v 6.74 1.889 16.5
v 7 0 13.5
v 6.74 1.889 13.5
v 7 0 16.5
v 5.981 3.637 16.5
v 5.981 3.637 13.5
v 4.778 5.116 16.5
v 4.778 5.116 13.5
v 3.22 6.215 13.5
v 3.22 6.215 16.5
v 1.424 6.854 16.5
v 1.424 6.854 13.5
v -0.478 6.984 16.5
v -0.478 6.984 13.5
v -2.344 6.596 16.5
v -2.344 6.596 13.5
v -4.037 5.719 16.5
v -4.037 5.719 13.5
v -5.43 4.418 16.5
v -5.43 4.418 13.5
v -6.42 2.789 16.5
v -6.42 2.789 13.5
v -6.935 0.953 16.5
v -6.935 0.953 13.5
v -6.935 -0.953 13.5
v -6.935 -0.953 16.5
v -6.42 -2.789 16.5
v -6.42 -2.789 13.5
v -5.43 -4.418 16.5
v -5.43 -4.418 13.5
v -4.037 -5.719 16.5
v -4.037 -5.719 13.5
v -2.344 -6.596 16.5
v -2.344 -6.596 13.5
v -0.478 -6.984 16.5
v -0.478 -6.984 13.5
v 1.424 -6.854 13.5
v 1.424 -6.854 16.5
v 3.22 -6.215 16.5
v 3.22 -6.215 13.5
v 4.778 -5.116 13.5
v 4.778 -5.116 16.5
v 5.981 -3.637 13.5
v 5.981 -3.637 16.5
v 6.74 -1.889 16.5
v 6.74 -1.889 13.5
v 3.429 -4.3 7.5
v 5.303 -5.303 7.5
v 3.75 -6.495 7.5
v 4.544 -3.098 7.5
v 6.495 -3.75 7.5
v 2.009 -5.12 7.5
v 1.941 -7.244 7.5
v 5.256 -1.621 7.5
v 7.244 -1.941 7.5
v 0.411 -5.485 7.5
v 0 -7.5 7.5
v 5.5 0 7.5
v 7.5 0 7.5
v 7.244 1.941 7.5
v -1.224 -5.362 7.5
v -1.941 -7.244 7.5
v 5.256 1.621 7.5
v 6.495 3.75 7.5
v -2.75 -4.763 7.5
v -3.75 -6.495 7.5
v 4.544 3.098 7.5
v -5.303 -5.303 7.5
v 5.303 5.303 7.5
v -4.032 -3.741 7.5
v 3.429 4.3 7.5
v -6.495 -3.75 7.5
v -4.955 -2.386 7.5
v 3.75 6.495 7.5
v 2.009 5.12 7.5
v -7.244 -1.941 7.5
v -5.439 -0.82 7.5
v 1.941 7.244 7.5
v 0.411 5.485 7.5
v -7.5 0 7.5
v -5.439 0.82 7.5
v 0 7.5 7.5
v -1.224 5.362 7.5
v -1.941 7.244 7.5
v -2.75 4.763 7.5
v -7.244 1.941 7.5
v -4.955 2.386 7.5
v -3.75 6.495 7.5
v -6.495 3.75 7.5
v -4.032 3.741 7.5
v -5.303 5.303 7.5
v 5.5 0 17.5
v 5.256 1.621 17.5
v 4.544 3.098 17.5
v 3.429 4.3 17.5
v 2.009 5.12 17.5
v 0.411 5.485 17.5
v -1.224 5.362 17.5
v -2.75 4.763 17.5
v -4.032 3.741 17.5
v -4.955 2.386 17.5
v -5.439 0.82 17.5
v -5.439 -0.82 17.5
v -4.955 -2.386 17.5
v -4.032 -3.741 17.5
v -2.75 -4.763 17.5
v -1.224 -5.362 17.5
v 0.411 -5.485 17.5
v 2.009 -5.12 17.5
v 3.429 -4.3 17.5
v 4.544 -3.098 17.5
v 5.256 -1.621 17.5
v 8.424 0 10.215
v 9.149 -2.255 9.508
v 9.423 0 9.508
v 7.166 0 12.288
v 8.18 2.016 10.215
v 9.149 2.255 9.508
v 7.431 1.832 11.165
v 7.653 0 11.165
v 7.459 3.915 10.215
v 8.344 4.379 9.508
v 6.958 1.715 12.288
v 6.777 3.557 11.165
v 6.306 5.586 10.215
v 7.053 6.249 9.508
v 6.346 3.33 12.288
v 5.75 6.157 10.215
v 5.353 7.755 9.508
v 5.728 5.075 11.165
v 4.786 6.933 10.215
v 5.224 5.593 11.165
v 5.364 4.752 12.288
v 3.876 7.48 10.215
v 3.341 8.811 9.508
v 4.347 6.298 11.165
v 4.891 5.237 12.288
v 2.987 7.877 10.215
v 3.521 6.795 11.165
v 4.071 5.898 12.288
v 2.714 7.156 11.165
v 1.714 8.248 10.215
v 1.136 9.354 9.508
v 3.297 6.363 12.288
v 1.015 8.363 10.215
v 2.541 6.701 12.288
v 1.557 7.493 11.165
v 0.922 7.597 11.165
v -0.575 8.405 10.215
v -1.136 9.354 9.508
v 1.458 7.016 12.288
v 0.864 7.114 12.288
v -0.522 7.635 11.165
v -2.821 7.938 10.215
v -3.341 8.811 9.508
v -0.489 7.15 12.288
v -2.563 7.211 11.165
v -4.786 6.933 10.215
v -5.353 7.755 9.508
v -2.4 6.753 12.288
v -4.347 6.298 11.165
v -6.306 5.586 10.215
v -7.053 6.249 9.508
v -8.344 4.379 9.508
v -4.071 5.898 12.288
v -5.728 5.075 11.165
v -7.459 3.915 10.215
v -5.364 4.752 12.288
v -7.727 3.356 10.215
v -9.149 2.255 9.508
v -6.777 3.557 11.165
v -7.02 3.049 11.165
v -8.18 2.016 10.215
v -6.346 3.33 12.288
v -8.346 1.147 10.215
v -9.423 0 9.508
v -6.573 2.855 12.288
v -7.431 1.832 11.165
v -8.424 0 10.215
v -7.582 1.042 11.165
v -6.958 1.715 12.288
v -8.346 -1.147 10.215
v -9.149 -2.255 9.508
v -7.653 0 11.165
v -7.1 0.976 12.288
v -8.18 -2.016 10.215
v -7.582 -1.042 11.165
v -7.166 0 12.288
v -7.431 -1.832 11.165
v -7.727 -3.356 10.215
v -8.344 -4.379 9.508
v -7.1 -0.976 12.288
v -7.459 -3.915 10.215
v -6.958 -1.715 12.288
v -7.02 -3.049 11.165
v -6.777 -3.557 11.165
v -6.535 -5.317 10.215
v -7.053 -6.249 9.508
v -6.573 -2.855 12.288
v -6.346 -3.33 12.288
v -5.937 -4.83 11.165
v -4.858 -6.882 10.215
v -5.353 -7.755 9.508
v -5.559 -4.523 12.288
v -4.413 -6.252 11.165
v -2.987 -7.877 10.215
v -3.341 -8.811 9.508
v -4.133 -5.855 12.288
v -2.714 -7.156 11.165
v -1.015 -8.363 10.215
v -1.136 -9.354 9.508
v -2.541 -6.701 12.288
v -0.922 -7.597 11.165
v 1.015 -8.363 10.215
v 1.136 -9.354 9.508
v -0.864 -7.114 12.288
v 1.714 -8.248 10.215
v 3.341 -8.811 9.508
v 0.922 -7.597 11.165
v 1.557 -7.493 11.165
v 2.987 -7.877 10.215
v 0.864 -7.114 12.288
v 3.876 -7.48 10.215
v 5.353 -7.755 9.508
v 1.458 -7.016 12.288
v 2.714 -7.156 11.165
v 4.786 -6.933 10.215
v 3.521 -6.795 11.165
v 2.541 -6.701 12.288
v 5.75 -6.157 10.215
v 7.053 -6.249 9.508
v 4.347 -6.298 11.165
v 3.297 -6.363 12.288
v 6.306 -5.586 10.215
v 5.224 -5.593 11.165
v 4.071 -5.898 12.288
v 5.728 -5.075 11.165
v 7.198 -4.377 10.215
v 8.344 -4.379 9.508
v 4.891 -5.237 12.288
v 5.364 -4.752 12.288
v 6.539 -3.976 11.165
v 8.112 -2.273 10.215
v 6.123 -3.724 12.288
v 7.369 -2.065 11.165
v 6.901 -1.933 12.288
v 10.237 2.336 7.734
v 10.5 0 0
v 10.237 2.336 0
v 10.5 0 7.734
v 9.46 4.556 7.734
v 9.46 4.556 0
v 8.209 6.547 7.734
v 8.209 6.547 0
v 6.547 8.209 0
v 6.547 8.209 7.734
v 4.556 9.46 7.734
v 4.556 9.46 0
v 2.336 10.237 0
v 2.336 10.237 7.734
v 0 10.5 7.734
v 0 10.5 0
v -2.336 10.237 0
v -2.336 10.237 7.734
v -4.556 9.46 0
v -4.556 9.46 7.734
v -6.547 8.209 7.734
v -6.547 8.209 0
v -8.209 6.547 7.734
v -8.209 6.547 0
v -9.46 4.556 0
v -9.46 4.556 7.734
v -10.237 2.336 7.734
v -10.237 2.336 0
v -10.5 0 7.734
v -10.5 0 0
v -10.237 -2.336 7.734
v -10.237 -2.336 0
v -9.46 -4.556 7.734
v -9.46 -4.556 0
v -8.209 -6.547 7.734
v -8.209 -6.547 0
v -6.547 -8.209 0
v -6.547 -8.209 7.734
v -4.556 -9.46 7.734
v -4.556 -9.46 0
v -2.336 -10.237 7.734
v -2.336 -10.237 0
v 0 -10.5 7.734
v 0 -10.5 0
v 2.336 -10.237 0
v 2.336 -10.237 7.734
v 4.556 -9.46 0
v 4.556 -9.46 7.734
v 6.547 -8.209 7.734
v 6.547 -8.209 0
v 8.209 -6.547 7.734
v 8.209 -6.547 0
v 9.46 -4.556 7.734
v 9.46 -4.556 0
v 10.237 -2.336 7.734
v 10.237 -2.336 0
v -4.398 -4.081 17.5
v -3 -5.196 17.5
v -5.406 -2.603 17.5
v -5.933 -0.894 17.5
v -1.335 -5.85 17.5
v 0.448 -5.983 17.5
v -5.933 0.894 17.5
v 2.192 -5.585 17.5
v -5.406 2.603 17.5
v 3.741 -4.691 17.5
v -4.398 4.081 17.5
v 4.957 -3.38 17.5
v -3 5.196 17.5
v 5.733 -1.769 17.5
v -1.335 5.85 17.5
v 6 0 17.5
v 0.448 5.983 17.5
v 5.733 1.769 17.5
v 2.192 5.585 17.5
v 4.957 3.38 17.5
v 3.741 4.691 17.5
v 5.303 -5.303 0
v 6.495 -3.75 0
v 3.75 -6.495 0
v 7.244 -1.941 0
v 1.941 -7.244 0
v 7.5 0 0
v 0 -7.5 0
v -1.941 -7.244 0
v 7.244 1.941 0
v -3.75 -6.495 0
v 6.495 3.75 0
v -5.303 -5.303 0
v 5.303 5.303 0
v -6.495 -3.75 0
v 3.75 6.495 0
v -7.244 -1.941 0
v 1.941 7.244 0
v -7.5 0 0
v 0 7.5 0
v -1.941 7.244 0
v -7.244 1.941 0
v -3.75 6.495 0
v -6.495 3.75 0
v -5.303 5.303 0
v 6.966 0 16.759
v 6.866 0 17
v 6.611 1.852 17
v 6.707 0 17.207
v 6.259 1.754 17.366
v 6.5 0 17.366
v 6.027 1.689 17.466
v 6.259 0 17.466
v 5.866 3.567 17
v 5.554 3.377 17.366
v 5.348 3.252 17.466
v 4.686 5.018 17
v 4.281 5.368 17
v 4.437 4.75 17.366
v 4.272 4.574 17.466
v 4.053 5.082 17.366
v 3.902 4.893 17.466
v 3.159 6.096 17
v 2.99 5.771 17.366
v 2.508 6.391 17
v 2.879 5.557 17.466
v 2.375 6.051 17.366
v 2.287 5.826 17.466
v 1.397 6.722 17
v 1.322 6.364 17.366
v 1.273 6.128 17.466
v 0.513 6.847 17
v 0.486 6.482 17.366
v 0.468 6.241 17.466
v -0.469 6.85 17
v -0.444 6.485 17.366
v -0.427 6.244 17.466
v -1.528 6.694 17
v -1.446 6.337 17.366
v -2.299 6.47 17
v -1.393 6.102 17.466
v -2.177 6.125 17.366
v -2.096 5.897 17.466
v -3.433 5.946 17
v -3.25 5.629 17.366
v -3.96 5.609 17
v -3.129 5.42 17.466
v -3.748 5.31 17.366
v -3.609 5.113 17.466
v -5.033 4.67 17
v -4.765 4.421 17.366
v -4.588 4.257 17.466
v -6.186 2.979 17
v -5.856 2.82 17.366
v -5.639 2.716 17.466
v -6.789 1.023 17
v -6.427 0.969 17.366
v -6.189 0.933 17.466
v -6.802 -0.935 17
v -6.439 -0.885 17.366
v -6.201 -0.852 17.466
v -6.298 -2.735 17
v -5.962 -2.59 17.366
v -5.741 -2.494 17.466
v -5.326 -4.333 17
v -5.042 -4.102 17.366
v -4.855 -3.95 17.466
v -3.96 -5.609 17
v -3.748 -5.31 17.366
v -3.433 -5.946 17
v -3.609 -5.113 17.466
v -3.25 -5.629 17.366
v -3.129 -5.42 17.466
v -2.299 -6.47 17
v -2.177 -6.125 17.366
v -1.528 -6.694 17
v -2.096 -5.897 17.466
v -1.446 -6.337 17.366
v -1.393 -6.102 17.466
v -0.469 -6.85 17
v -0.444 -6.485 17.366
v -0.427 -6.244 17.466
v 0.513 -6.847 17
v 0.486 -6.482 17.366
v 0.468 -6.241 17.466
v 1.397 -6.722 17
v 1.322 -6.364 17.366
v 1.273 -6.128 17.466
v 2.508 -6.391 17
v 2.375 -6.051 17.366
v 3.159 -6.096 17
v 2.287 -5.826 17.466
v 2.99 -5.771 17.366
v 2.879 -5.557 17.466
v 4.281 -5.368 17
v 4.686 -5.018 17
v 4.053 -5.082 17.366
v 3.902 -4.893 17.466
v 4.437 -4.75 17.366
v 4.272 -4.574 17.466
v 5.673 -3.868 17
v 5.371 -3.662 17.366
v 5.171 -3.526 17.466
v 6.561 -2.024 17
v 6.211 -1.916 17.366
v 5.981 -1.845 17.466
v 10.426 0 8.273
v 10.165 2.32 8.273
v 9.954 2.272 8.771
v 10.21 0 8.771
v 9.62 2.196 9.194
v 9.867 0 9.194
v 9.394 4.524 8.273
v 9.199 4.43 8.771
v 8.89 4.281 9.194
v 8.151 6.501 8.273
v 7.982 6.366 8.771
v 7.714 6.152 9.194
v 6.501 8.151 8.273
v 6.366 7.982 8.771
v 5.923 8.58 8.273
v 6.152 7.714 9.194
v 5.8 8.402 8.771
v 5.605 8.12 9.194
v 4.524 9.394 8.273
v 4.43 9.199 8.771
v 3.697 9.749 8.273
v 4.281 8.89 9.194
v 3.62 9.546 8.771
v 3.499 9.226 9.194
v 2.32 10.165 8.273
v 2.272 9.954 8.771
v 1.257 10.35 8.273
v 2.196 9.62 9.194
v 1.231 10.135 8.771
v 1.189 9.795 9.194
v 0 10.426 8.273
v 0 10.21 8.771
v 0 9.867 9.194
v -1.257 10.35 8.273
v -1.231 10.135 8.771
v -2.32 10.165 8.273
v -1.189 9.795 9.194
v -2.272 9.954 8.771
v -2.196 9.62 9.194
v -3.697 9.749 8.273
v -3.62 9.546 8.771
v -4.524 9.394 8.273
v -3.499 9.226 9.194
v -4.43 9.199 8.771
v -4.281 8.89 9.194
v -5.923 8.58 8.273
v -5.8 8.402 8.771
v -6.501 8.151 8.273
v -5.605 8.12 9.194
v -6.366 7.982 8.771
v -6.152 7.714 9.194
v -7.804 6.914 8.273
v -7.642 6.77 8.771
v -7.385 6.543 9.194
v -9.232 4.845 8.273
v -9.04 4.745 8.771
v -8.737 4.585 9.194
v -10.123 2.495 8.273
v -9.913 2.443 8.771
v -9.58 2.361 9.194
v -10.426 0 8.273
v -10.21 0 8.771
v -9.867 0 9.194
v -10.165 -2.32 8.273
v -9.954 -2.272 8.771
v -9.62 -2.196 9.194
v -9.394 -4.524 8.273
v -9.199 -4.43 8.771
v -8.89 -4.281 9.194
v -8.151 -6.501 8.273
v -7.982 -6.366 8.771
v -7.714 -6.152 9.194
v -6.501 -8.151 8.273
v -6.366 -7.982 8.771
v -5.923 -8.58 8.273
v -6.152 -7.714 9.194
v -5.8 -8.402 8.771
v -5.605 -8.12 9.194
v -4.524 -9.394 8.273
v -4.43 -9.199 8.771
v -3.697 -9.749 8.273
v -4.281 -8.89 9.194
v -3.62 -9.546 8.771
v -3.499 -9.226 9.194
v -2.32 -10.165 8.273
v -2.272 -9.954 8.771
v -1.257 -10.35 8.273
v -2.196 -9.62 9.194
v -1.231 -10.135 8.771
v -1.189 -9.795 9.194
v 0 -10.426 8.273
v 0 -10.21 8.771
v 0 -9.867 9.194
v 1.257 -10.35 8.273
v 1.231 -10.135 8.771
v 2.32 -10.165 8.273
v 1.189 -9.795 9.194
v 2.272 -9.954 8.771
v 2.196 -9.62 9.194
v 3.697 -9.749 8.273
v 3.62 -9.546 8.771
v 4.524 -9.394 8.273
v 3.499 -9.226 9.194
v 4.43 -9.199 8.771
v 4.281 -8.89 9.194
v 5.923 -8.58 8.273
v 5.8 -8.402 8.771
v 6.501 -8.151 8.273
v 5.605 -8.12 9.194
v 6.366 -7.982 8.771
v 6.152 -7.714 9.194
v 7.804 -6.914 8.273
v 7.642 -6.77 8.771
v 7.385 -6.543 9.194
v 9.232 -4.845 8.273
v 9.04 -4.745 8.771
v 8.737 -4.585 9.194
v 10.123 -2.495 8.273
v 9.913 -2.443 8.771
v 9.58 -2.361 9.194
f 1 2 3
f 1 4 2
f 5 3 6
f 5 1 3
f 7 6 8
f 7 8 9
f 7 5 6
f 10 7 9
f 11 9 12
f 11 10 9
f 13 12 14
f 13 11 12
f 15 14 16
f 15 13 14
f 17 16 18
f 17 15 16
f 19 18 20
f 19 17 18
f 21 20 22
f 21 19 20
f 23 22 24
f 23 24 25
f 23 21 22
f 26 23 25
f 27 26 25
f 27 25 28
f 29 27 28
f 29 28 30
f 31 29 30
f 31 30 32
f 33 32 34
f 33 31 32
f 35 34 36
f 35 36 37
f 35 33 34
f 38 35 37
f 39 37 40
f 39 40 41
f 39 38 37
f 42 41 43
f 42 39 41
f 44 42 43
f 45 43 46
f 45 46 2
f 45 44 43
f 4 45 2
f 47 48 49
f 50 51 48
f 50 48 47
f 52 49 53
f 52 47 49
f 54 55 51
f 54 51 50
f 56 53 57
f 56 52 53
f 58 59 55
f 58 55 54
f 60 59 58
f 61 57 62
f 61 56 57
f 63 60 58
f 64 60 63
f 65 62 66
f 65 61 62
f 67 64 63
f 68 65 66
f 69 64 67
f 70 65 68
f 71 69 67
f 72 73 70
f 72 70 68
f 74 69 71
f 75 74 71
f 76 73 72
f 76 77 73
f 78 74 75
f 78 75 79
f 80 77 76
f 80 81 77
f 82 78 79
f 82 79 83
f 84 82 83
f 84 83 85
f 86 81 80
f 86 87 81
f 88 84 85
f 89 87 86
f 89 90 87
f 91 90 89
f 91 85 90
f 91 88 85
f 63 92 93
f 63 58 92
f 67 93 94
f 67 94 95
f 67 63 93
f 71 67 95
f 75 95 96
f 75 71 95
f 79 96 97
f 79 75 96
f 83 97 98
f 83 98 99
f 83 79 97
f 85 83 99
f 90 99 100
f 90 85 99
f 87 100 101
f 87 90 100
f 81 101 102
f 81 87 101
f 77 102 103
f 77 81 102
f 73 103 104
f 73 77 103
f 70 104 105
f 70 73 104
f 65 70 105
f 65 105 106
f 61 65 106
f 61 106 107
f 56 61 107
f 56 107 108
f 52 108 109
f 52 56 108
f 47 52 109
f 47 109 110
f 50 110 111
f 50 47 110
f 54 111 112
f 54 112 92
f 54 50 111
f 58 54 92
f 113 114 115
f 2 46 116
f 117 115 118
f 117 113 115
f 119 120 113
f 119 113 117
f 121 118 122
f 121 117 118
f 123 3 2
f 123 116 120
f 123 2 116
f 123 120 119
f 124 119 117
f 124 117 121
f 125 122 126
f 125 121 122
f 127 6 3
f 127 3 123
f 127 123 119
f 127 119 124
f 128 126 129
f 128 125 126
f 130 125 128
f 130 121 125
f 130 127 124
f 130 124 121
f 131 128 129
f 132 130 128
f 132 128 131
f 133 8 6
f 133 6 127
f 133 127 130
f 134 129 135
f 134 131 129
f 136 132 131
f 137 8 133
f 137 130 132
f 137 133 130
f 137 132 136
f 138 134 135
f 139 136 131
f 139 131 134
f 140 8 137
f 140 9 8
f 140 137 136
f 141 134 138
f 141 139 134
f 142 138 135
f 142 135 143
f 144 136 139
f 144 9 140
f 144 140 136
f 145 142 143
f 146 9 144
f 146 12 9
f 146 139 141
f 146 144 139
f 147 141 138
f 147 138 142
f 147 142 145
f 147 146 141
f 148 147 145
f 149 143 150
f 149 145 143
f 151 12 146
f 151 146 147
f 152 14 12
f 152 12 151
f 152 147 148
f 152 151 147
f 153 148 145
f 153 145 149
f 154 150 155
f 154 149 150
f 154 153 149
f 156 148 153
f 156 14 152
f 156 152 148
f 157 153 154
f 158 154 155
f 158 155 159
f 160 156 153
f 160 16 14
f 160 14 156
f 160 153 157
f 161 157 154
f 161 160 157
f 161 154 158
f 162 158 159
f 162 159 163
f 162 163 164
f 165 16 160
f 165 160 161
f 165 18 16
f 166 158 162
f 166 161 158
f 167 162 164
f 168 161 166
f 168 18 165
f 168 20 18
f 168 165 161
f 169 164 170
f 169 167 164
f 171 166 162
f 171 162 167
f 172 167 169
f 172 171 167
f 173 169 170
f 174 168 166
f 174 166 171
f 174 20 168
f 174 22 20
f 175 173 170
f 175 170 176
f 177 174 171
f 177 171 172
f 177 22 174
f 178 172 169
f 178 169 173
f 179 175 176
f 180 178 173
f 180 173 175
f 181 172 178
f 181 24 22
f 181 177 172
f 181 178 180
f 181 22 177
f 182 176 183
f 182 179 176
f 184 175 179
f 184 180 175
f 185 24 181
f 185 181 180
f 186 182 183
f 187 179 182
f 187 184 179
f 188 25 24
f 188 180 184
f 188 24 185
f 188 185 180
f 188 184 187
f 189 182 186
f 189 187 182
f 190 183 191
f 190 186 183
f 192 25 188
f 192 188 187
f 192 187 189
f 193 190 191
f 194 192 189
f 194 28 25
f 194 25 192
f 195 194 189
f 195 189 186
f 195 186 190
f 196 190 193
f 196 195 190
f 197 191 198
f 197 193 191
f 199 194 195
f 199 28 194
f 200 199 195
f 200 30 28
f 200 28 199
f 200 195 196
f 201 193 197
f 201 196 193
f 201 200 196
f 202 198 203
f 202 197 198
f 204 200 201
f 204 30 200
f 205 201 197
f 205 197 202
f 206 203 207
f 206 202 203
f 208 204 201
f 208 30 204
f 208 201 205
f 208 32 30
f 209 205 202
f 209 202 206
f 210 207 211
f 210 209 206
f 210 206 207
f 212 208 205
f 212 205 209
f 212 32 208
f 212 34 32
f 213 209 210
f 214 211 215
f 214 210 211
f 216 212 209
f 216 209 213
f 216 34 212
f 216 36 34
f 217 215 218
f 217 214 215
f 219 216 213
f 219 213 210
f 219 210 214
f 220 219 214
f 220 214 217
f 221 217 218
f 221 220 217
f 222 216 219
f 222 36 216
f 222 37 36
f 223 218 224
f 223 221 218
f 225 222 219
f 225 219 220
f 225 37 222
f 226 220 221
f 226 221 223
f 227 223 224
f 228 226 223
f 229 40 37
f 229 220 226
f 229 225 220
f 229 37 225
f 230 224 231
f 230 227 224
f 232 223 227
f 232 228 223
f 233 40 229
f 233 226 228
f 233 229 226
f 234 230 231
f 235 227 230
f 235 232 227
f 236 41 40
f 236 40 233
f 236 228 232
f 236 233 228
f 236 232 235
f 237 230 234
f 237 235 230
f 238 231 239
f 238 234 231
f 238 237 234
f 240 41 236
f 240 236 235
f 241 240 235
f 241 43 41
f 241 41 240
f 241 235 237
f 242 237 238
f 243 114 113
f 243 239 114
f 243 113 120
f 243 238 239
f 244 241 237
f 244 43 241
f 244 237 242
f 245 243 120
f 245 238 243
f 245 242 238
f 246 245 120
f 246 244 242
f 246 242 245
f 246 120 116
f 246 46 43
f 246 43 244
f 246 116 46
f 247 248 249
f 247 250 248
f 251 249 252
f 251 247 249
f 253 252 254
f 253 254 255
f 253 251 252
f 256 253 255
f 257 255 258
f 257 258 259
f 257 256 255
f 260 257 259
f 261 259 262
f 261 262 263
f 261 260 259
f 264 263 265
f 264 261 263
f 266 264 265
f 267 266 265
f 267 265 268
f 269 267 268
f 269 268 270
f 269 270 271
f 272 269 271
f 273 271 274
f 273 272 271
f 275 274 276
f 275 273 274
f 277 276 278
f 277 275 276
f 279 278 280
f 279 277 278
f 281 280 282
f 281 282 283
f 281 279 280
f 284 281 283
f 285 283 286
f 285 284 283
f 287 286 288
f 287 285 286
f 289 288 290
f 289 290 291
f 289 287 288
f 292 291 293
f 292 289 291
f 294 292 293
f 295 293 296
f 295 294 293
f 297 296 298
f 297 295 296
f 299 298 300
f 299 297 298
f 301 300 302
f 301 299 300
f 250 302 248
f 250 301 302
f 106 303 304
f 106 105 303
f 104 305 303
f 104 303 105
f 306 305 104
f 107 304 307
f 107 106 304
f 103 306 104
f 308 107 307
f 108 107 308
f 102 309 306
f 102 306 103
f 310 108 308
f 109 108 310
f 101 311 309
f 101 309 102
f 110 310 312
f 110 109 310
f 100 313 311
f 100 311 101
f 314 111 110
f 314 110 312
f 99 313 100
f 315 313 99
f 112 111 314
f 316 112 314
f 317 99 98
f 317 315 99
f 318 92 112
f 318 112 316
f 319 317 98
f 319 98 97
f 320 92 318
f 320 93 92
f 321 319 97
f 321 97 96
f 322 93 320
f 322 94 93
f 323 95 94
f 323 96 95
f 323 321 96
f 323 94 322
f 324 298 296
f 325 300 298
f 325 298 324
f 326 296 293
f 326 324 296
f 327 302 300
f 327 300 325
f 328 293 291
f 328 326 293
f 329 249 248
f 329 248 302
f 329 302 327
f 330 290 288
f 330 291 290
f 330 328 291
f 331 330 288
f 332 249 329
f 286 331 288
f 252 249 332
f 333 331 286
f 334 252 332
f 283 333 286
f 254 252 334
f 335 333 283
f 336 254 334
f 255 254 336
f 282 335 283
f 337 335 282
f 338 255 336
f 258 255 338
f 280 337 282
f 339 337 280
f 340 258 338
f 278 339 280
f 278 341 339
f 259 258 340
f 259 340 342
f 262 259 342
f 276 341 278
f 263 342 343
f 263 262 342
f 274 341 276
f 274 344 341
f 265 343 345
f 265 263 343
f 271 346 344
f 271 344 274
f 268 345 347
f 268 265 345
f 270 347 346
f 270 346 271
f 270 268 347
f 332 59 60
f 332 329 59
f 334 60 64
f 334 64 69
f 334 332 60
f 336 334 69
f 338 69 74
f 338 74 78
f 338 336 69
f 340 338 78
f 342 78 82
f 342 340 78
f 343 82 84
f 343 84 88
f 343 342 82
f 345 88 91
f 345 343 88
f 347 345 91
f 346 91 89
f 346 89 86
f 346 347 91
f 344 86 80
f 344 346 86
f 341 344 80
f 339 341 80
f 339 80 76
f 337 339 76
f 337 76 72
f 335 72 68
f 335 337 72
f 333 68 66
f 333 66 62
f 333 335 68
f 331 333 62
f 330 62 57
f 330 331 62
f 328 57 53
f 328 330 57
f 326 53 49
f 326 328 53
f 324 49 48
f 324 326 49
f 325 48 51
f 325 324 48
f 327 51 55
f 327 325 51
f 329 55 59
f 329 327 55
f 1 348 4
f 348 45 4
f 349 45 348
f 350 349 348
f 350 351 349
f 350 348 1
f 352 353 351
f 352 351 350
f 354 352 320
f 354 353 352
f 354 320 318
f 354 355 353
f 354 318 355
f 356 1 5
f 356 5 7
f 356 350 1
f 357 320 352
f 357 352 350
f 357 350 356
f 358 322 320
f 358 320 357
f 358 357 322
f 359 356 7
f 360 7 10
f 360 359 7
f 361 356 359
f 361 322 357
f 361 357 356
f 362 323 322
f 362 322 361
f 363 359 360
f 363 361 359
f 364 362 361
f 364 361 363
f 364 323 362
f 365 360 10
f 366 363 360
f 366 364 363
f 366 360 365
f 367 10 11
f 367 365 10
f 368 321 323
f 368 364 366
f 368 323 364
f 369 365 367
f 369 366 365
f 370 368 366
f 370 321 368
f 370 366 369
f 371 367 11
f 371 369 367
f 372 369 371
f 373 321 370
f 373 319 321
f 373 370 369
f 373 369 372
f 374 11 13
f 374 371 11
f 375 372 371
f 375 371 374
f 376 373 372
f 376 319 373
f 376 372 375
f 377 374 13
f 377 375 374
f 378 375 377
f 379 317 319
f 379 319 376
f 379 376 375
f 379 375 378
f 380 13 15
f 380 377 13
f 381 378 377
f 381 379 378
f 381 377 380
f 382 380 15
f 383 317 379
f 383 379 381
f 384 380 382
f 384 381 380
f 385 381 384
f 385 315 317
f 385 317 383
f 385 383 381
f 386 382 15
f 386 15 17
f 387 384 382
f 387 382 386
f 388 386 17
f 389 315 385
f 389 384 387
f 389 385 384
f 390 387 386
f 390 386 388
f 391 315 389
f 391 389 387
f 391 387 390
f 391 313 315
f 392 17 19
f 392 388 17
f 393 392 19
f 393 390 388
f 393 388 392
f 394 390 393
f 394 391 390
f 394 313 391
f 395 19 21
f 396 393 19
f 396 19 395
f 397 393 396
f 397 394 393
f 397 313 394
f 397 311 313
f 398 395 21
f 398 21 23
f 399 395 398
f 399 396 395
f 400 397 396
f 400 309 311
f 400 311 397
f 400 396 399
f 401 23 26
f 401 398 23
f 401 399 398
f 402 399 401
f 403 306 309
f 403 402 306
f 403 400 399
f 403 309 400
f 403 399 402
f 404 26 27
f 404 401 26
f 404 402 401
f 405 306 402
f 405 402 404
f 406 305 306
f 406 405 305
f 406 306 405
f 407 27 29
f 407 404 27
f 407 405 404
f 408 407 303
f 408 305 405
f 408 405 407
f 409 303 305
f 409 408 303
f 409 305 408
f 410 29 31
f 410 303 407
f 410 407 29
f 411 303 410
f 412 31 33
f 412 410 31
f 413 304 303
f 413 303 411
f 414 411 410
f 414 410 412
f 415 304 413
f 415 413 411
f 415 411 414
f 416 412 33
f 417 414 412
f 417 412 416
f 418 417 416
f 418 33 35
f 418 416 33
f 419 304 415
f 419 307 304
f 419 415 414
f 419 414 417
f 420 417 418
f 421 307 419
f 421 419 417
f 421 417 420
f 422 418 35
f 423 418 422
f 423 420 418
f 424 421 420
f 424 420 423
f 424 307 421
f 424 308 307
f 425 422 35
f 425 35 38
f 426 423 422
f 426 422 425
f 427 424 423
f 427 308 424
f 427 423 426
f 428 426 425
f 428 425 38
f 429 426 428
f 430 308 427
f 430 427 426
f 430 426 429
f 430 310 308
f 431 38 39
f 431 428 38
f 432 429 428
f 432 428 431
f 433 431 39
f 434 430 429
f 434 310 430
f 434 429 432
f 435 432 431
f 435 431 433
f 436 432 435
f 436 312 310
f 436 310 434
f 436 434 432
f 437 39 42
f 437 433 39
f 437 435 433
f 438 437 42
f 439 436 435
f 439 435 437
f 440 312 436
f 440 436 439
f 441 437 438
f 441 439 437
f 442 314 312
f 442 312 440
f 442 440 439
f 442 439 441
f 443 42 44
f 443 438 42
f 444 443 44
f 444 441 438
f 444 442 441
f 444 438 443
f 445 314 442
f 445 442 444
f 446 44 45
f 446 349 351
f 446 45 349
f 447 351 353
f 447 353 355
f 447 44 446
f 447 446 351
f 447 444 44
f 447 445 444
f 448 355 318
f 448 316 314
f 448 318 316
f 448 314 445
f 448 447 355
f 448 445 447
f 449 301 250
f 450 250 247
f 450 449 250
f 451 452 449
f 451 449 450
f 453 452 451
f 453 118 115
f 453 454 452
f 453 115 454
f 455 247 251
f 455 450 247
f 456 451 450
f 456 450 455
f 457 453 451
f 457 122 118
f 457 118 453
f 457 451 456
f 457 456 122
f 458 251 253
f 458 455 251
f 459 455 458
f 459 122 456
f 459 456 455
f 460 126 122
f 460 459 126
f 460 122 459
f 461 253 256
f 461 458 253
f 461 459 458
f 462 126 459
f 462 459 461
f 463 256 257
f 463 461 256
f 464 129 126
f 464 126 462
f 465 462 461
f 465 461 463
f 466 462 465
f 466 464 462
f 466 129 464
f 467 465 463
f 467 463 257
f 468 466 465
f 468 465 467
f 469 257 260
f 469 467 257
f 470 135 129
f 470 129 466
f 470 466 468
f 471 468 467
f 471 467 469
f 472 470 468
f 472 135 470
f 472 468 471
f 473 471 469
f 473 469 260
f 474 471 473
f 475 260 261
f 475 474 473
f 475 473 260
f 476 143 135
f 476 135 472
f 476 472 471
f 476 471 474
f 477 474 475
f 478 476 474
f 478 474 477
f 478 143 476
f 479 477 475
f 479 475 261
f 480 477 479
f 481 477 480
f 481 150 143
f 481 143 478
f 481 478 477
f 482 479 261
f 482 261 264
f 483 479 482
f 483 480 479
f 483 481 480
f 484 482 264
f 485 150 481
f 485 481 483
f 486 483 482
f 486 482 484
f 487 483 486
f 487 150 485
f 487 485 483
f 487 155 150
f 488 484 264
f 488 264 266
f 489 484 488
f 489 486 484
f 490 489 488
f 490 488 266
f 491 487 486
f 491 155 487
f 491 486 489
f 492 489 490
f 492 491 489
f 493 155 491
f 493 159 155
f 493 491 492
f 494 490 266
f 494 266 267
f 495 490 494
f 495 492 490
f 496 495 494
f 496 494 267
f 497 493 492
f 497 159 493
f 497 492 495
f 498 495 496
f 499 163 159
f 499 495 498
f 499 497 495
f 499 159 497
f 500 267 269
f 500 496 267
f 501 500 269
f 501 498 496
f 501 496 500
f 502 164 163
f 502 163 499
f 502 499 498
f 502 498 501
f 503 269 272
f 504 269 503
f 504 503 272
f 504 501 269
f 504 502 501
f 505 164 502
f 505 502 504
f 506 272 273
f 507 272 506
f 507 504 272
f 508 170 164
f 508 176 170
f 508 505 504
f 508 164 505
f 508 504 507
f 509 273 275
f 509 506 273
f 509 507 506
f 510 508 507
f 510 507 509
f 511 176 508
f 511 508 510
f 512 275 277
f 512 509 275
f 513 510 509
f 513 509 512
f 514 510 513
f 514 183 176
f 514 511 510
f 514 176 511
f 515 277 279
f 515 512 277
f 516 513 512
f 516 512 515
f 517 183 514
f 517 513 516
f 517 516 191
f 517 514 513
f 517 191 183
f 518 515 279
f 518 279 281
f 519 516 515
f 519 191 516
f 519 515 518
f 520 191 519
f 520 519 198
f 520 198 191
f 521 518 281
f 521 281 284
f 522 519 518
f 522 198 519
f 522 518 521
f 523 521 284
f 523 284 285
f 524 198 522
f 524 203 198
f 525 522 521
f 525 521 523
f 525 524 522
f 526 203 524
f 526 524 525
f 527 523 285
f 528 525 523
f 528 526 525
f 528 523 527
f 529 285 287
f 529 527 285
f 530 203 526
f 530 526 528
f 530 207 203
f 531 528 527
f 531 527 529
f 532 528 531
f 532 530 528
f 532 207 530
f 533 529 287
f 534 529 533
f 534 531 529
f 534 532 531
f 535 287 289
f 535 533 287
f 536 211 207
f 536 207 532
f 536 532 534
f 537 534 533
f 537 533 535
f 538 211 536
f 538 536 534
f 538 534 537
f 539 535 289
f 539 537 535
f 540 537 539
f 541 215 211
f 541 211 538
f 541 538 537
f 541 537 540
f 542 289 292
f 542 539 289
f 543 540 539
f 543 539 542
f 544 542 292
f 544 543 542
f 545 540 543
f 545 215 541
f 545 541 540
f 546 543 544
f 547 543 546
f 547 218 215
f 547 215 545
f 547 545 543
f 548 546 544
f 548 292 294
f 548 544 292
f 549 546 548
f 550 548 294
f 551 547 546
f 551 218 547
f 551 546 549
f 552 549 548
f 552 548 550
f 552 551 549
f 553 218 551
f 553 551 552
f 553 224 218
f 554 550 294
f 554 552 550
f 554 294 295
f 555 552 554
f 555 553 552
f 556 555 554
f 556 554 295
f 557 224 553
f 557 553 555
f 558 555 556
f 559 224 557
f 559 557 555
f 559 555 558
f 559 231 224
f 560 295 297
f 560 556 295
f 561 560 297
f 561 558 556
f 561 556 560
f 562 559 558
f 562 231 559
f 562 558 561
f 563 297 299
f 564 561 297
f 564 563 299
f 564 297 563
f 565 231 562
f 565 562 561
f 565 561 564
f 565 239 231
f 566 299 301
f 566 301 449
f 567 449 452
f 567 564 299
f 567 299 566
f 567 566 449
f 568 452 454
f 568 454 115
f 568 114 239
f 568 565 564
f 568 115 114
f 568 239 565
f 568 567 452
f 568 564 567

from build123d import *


with BuildPart() as f1:
    # F0 (on Front) → F1 (revolve)
    with BuildSketch(Plane.XZ):
        with BuildLine():
            Line((7.5, 7.5), (7.5, 0))
            Line((7.5, 0), (10.5, 0))
            Line((10.5, 0), (10.5, 7.733719))
            ThreePointArc((10.5, 7.733719), (10.209701, 8.771468), (9.423077, 9.507959))
            ThreePointArc((9.423077, 9.507959), (7.653173, 11.165065), (7, 13.5))
            Line((7, 13.5), (7, 16.5))
            ThreePointArc((7, 16.5), (6.707107, 17.207107), (6, 17.5))
            Line((6, 17.5), (5.500039, 17.5))
            Line((5.500039, 17.5), (5.500039, 7.5))
            Line((5.500039, 7.5), (7.5, 7.5))
        make_face()
    revolve(axis=Axis((0, 0, 9.159326), (0, 0, 1)))


solid = f1.part
